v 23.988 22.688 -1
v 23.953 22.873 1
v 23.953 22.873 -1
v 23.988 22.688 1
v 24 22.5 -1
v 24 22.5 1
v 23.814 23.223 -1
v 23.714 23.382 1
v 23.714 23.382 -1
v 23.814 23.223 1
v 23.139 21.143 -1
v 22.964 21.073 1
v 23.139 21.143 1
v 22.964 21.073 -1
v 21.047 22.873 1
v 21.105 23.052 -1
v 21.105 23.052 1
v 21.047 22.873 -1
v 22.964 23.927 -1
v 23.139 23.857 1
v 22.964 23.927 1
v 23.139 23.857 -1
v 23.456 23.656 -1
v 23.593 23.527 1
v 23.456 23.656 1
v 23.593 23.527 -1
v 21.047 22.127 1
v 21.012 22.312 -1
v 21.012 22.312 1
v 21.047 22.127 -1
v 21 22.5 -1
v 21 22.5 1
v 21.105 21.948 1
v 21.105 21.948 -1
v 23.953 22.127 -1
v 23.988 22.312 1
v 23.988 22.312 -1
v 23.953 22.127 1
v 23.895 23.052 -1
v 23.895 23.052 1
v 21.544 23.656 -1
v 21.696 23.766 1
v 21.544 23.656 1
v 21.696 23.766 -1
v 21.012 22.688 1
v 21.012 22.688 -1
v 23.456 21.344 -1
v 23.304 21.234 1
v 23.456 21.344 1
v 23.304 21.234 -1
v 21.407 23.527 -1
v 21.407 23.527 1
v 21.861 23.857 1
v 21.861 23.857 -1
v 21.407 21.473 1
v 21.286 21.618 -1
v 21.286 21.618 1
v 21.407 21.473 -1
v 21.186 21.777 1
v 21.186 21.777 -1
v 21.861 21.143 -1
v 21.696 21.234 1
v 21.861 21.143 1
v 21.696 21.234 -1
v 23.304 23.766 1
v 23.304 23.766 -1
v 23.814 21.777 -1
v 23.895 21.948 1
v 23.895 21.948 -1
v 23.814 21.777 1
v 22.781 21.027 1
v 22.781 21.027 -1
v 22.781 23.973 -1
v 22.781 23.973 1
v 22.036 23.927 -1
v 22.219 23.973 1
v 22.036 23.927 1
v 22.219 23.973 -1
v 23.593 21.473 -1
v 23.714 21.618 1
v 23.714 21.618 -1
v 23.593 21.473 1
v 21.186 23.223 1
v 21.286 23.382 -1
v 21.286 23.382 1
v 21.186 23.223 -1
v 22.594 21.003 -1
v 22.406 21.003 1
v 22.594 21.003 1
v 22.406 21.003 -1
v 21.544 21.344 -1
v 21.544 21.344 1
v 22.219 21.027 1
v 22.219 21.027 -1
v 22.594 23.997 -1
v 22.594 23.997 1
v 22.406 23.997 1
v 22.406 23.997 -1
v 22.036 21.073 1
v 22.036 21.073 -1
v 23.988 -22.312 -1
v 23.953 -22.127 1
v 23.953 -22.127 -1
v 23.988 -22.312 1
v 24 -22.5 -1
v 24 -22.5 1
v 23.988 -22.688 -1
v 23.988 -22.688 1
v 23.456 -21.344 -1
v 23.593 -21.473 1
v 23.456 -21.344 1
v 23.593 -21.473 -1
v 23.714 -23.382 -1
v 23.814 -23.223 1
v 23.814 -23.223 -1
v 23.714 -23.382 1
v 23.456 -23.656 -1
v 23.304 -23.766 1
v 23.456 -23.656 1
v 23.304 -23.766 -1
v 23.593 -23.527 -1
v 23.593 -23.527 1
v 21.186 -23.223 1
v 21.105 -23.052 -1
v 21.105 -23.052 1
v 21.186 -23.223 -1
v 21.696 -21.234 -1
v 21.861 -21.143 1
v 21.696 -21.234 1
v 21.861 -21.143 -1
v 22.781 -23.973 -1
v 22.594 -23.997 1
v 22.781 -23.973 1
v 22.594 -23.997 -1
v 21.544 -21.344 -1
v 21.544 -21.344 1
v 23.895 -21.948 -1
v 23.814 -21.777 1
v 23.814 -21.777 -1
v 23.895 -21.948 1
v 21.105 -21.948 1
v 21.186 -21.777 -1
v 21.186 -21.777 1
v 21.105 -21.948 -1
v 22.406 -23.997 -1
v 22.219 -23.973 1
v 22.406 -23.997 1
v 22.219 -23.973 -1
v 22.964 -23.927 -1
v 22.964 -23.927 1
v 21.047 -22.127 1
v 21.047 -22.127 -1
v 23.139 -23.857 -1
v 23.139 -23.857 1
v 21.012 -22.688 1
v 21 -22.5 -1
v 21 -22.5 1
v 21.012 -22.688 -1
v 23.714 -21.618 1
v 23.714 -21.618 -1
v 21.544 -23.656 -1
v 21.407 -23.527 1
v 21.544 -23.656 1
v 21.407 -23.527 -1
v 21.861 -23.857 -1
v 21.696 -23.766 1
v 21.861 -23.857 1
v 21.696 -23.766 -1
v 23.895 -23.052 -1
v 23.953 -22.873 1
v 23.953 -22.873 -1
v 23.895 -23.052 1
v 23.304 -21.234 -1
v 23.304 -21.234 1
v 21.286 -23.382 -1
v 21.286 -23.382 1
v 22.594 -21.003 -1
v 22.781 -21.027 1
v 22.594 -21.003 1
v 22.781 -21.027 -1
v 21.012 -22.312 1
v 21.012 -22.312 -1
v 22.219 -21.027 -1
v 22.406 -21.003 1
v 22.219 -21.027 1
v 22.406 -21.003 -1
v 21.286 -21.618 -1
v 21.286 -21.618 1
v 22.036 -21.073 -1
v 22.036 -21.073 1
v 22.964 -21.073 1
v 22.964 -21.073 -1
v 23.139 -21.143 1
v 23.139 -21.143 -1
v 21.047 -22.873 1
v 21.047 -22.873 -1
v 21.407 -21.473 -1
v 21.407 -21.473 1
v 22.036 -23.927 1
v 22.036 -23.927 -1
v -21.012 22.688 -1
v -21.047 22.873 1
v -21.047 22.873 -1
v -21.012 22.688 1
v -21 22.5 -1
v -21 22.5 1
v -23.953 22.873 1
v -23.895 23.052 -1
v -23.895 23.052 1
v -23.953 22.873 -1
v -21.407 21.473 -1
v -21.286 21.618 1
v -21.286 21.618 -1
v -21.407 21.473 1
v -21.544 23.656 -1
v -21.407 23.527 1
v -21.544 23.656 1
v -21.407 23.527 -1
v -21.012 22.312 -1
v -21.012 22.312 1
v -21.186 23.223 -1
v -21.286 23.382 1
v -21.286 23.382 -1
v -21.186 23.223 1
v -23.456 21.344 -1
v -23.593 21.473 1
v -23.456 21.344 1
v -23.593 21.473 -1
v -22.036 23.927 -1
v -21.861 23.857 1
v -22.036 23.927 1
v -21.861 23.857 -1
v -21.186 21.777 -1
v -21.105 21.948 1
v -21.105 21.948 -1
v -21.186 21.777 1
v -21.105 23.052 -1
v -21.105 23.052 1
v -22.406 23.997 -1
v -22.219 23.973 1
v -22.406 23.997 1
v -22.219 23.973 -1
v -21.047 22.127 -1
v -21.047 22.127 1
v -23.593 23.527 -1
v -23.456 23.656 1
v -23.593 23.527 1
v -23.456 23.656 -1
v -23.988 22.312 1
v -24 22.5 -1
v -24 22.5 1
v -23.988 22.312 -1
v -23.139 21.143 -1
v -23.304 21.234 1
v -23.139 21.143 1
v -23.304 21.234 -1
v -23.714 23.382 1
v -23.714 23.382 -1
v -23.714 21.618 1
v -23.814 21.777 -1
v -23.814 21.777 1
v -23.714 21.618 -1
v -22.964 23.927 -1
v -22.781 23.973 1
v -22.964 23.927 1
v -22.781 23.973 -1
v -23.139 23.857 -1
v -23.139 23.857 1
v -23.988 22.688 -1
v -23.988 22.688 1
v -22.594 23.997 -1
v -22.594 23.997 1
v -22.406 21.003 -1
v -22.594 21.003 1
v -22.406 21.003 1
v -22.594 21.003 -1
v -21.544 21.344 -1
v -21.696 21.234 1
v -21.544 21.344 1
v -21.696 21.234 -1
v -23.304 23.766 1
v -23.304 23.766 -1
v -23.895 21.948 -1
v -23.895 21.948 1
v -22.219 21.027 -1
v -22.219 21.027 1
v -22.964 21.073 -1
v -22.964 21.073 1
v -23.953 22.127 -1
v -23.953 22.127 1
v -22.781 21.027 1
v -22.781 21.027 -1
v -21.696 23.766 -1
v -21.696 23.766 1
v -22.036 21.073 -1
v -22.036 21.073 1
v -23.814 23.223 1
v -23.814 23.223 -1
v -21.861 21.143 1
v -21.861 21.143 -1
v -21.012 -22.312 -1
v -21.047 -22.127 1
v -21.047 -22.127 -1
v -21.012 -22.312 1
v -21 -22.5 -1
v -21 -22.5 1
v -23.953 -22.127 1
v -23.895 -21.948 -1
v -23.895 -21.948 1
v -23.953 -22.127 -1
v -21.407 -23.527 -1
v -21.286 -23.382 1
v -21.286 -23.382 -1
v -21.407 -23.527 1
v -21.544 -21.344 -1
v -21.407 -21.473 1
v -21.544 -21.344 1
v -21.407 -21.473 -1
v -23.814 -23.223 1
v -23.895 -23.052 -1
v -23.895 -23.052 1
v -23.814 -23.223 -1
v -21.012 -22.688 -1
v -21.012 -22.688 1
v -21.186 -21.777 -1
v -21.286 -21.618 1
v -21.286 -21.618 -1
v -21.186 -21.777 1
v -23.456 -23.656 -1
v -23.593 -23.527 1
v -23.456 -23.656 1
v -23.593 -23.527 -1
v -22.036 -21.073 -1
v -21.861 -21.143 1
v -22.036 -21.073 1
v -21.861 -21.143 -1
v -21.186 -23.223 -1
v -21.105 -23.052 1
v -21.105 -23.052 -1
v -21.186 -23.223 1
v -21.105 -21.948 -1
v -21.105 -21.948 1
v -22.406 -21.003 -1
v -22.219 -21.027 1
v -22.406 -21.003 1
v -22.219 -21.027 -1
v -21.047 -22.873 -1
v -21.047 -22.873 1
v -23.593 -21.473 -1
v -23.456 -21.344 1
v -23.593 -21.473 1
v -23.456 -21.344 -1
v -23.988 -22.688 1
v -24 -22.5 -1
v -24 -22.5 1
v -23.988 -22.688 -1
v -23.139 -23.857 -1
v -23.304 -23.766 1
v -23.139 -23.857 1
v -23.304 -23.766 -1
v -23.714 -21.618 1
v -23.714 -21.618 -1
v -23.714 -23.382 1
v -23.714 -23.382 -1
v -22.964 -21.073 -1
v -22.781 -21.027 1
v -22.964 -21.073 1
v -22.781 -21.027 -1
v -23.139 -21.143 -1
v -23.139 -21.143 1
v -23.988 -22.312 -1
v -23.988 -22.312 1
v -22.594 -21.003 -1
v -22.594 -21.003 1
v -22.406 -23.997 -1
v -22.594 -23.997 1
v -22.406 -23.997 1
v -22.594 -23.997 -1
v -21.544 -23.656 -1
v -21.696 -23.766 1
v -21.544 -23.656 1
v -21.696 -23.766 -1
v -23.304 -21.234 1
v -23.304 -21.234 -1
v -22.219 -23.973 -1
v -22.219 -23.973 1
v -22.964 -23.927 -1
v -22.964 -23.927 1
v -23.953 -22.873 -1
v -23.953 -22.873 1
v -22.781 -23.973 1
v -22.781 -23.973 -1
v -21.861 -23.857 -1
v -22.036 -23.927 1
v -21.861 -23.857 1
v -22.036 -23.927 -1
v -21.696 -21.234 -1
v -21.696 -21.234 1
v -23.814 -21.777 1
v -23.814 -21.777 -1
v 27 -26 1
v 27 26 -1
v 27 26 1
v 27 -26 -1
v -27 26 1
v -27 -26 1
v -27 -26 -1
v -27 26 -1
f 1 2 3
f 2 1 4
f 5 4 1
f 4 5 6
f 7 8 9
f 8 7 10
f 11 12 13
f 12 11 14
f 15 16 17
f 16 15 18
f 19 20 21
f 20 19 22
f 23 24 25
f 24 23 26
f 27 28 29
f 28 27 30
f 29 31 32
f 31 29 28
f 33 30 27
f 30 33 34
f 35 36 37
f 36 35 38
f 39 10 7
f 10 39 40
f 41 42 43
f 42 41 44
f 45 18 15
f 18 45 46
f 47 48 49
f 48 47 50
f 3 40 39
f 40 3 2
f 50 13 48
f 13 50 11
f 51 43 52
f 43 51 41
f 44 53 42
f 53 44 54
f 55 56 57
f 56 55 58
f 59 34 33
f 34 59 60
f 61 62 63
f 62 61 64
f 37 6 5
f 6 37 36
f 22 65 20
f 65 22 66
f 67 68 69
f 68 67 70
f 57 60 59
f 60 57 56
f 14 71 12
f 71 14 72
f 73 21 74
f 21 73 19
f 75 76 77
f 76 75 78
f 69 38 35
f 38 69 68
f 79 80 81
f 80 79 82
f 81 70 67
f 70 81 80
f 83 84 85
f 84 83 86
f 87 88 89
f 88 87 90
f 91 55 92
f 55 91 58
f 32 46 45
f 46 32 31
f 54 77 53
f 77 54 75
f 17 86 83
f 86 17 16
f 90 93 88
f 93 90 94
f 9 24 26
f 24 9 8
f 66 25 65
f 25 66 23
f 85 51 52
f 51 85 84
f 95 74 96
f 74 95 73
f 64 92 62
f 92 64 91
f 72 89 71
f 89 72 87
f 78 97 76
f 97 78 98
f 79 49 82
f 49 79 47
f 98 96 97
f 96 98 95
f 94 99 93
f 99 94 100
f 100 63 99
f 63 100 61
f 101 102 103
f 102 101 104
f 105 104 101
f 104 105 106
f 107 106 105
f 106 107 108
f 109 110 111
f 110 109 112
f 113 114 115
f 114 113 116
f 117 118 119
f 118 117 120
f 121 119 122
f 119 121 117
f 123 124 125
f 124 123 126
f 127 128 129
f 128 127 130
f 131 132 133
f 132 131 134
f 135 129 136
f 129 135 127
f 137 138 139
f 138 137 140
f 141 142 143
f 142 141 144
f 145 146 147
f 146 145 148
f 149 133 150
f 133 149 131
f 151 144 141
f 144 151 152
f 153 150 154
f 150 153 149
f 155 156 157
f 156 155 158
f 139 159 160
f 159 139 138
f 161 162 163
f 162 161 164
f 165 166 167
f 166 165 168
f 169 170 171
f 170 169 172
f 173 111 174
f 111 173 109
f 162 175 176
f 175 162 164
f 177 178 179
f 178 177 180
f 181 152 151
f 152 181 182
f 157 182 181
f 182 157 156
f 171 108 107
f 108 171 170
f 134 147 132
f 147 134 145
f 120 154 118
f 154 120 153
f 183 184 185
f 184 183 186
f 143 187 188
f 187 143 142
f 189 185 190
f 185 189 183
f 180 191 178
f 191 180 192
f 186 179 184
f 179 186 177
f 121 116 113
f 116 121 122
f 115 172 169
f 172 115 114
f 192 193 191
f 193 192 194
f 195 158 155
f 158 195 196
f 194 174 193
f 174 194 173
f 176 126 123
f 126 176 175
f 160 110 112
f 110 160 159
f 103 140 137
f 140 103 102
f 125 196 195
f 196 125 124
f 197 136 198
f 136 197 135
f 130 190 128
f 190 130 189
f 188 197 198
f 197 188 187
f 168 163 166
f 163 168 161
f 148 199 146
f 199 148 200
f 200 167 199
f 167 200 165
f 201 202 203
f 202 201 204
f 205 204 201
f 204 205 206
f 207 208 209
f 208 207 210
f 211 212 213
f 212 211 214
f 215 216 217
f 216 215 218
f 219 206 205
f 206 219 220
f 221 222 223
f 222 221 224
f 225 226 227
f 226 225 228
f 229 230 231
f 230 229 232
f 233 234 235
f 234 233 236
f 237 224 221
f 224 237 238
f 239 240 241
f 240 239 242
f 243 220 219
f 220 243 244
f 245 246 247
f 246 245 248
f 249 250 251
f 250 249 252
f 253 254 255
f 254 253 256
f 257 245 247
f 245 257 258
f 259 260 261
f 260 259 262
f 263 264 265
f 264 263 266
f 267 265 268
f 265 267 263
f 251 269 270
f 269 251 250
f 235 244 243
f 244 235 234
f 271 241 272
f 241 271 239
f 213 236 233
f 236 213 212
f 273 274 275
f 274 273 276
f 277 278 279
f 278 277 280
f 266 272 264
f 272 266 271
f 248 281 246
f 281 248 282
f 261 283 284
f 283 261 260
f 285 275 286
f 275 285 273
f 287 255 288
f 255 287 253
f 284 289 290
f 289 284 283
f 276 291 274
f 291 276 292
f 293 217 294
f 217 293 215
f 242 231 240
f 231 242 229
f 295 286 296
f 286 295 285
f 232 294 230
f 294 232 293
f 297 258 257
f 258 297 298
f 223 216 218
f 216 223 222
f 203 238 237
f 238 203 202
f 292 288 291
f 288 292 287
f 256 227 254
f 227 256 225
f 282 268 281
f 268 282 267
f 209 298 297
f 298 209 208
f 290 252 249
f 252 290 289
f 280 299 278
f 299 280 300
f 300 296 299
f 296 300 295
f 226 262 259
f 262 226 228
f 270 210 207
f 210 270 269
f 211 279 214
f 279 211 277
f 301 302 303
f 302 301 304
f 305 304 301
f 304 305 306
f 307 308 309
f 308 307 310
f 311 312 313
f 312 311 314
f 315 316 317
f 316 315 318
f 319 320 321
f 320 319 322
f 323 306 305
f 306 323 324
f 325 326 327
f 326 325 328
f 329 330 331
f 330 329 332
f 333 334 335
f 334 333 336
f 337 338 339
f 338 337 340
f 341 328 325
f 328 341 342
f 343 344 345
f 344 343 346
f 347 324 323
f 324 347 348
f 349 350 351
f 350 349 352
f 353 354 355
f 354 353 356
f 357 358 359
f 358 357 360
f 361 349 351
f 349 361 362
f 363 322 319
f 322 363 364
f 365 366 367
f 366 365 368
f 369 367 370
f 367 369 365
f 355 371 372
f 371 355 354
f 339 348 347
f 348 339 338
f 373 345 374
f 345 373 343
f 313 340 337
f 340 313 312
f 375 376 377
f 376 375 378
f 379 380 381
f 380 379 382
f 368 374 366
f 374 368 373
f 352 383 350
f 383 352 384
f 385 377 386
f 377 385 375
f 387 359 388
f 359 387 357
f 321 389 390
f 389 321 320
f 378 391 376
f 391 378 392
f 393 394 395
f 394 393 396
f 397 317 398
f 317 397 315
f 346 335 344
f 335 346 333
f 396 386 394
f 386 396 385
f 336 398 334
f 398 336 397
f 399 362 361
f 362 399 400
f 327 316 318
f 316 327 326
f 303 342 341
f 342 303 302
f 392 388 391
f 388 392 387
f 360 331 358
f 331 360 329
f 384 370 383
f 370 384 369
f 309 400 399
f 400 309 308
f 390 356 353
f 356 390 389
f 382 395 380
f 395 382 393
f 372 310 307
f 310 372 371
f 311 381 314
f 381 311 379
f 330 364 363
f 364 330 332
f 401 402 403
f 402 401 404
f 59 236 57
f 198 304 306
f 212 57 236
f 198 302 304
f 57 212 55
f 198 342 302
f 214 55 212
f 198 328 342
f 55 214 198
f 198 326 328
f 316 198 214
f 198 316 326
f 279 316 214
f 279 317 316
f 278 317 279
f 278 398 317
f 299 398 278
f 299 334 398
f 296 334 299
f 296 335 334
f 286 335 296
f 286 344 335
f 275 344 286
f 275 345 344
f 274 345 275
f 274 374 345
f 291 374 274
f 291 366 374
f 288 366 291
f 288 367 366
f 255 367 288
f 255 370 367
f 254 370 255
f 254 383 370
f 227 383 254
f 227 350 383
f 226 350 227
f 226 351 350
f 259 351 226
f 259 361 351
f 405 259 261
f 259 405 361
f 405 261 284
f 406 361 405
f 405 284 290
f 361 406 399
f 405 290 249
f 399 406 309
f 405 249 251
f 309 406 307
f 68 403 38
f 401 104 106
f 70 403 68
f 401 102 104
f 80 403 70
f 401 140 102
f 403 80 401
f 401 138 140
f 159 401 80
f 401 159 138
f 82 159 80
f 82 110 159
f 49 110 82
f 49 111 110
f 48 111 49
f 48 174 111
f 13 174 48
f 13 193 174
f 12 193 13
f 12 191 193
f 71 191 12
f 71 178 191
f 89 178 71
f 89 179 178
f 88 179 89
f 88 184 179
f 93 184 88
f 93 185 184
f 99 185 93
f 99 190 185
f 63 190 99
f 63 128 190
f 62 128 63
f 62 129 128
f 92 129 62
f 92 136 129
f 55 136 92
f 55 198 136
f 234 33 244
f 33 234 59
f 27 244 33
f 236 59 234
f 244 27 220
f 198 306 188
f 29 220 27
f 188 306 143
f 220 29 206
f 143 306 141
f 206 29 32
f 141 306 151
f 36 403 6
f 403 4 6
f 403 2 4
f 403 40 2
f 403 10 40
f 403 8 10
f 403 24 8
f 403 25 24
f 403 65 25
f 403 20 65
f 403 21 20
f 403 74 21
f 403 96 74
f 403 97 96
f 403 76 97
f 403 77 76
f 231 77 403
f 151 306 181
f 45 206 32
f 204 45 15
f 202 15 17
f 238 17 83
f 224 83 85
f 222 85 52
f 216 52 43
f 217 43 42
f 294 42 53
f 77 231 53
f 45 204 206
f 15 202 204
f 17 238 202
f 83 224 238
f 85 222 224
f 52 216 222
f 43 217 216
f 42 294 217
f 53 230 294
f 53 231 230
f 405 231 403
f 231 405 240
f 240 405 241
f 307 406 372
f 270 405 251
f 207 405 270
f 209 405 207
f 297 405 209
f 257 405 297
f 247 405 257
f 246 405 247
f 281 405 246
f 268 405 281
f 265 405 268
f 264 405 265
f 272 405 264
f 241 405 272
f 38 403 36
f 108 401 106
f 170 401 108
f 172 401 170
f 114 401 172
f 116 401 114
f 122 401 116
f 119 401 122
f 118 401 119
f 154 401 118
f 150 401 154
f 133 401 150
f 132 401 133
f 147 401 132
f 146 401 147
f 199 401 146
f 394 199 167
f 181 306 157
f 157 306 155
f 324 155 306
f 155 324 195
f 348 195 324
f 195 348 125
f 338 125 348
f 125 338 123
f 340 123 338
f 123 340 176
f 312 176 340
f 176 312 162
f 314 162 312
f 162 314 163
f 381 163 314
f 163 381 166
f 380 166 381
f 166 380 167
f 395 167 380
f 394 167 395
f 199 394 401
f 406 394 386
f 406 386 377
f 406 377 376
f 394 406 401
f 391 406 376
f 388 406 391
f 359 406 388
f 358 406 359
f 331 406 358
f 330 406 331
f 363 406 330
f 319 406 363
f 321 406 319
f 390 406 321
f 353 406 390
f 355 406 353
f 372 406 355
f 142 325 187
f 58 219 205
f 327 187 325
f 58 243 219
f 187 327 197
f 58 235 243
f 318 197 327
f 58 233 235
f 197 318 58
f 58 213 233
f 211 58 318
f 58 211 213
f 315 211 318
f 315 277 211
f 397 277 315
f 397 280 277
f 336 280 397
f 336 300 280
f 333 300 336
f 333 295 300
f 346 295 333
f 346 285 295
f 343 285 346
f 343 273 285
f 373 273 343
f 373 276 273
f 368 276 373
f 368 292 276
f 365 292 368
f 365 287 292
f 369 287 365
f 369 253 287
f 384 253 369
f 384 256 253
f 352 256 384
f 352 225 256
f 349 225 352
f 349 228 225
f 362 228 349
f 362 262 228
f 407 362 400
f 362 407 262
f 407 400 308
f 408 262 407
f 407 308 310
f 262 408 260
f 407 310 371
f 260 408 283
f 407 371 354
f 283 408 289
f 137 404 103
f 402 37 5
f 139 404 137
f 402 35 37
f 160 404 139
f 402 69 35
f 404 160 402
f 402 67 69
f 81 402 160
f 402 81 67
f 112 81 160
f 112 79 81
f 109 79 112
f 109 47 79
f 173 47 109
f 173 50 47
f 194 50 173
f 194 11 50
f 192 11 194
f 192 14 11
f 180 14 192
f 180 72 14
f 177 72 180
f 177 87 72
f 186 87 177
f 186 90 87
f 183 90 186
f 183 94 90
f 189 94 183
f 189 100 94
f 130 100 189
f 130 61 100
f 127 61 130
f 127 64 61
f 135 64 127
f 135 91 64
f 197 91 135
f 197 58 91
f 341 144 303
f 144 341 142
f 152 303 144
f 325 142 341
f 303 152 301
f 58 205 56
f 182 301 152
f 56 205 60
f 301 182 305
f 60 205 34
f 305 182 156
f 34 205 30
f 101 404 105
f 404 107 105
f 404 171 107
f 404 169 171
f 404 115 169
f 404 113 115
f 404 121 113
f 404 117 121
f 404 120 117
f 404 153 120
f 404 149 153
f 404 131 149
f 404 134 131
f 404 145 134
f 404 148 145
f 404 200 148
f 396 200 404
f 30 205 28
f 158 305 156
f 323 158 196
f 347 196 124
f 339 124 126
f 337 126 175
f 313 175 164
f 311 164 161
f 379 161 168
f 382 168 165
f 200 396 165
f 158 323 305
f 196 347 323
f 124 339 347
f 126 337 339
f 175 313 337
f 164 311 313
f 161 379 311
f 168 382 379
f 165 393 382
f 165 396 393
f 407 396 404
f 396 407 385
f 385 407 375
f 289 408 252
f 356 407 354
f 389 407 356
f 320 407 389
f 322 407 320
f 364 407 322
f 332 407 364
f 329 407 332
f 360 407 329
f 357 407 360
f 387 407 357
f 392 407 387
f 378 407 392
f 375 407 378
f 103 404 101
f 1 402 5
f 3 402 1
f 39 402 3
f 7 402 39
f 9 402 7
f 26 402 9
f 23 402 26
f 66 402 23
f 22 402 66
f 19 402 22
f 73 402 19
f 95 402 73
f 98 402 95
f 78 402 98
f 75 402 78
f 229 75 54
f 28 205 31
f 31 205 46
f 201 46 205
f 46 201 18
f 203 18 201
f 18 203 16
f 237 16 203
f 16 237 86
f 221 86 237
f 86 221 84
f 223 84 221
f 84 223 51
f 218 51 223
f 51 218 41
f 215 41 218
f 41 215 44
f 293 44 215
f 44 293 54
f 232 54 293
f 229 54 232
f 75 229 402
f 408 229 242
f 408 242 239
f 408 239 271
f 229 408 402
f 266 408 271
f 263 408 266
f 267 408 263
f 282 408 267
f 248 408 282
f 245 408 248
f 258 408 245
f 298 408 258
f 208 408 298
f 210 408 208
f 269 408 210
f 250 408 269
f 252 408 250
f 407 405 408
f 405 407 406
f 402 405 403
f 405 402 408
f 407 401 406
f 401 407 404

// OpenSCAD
// file: utils.scad
// Cube with rounded corners
// roundedCornerCube (50,50,4);
module roundedCornerCube(length, width, thickness){

        hull()
        {
            translate([length/2, width/2, 0]) cylinder(r=2, h=thickness, $fn=50, center=true);
            translate([length/2, -width/2, 0]) cylinder(r=2, h=thickness, $fn=50, center=true);
            translate([-length/2, width/2, 0]) cylinder(r=2, h=thickness, $fn=50, center=true);
            translate([-length/2, -width/2, 0]) cylinder(r=2, h=thickness, $fn=50, center=true);
        }

}

// Hollow cube with rounded corners. Will look like a frame with rounded con
// hollowRoundedCornerCube(50,70,4,2);
module hollowRoundedCornerCube(length, width, thickness, wallthickness)
{
    difference()
    {
        roundedCornerCube(length,width,thickness);
        roundedCornerCube(length-(wallthickness*2),width-(wallthickness*2),thickness);
    }
}

/*
module cylinderWithHandle(radius, thickness)
{
    rotate_extrude($fn=100)
        polygon( points = [[0,0], [radius,0], [radius,thickness] , [1,thickness], [2,thickness + 2] , [2,thickness + 6],[0,thickness + 6]] );
}
*/


// hollow cylinder
// hollowCylinder(radius, height, wallThickness)
// radius : radius to outter wall
// wallThickness : Thickness of wall
module hollowCylinder(radius, height, wallThickness)
{

    difference()
    {
        cylinder(h=height, r1=radius, r2=radius);
        cylinder(h=height, r1=radius - wallThickness, r2=radius - wallThickness);
    }
}


// hollow cylinders
// hollowCylinders(20, 10, 2, 2, 2)
// radius : radius to outer wall
// gapsSize : size of gap between each rings
// minradius : radius of the smallest ring
module hollowCylinders(radius, height, wallThickness, gapSize, minRadius)
{
    for (i = [radius : -(gapSize + wallThickness) : minRadius])
    {
       //echo (i);
       hollowCylinder(i,height,wallThickness);
    }
}

module cone(bottomRadius, topRadius, height)
{
    cylinder(h=height, r1=bottomRadius, r2=topRadius, $fn=100);
}

// hollowCone(10,4,20, 2)
module hollowCone(bottomRadius, topRadius, height, wallThickness)
{
    difference()
    {
        cylinder(h=height, r1=bottomRadius, r2=topRadius, $fn=100);
        cylinder(h=height, r1=bottomRadius - wallThickness, r2=topRadius - wallThickness, $fn=100);
    }
}


///////////////////////////////////////////////////////////////////////////////////////////////////////////////////

// honeycomb tiles
// honeycombSquare(100,100,4,10,2);
module honeycombTiles(length, width,thickness,rad,wallThickness)
{
    //thickness = 4;
    //rad = 10;
    //wallThickness = 2;
    //length = 100;
    //width = 100;

    for (w=[0: width/rad])
    {

        if (w % 2 == 0)
        {
            //cylinder($fn=6, r=rad, h=2);
            for (i = [0 : length/((rad*2) + (wallThickness*2))])
            {
              translate([rad*(3*i) + (wallThickness*2)*i,w*rad,0]) cylinder($fn=6, r=rad, h=thickness);

              //translate([rad*6 + (wallThickness*2)*2,0,0]) cylinder($fn=6, r=10, h=2);
              //translate([rad*9 + (wallThickness*2)*3,0,0]) cylinder($fn=6, r=10, h=2);
            }
        }

        if (w % 2 == 1)
        {
            for (j = [1 : 2 : (length/(rad + wallThickness))])
            {
              translate([(rad*1.5) *j + wallThickness *j , (w*rad) + wallThickness/2 ,0])  cylinder($fn=6, r=rad, h=thickness);
                //translate([(rad*1.5) *3 + wallThickness *3 ,10,0]) circle($fn=6, r=10);
                //translate([(rad*1.5) *5 + wallThickness *5 ,10,0]) circle($fn=6, r=10);
            }
        }
    }
}

// honeycomb square
// A square area with hollow honeycomb design
// honeycombSquare(100,100,4,10,2);
module honeycombSquare(length, width, thickness, cellRad,wallThickness)
{
    difference()
    {
        cube([length,width,thickness], center=true);
        translate([-length/2,-width/2, -thickness/2]) honeycombTiles(length,width,thickness,cellRad,wallThickness);
    }
}

//honeycomb(length, width, height, cell_size, wall_thickness);
//honeycomb(50, 50, 4, 10, 1);
//hollowRoundedCornerCube(50,70,4,2);

//hollowCylinder(10,20,2);

//hollowCylinders(20, 10, 2, 2, 2);
//cone(10,2,20);

// hollowCone(10,4,20, 2);

// honeycombSquare(40,40,2,5,2);
// main file
use <utils.scad>

// hole - hole outer 48 mm . Platform should be atleast this
platformInnerLength = 48;
platformInnerWidth = 48;

// Area
platformOuterLength = 54;
platformIOuterWidth = 52;


receiverLength = 52;
receiverWidth = 34.5;
thickness = 2;
endStopLength = 10;

threadDia = 3; //this should be atleast 2.5 mm



module base()
{

}

module edgeStop()
{
    cube([endStopLength,thickness,thickness]);
    rotate([0,0,90]) cube([endStopLength,thickness,thickness]);
}


 //translate([0,-thickness,0]) edgeStop();
module pokeHoles()
{
    translate([platformInnerLength/2 - threadDia/2, platformInnerWidth/2 - threadDia/2, 0]) cylinder(r=threadDia/2, h=thickness*2, $fn=50, center=true);
    translate([platformInnerLength/2 - threadDia/2, -platformInnerWidth/2 + threadDia/2, 0]) cylinder(r=threadDia/2, h=thickness*2, $fn=50, center=true);
    translate([-platformInnerLength/2 + threadDia/2, platformInnerWidth/2- threadDia/2, 0]) cylinder(r=threadDia/2, h=thickness*2, $fn=50, center=true);
    translate([-platformInnerLength/2 + threadDia/2, -platformInnerWidth/2 + threadDia/2, 0]) cylinder(r=threadDia/2, h=thickness*2, $fn=50, center=true);
}

difference()
{
    cube([platformOuterLength,platformIOuterWidth,thickness], center=true);
    pokeHoles();
}
